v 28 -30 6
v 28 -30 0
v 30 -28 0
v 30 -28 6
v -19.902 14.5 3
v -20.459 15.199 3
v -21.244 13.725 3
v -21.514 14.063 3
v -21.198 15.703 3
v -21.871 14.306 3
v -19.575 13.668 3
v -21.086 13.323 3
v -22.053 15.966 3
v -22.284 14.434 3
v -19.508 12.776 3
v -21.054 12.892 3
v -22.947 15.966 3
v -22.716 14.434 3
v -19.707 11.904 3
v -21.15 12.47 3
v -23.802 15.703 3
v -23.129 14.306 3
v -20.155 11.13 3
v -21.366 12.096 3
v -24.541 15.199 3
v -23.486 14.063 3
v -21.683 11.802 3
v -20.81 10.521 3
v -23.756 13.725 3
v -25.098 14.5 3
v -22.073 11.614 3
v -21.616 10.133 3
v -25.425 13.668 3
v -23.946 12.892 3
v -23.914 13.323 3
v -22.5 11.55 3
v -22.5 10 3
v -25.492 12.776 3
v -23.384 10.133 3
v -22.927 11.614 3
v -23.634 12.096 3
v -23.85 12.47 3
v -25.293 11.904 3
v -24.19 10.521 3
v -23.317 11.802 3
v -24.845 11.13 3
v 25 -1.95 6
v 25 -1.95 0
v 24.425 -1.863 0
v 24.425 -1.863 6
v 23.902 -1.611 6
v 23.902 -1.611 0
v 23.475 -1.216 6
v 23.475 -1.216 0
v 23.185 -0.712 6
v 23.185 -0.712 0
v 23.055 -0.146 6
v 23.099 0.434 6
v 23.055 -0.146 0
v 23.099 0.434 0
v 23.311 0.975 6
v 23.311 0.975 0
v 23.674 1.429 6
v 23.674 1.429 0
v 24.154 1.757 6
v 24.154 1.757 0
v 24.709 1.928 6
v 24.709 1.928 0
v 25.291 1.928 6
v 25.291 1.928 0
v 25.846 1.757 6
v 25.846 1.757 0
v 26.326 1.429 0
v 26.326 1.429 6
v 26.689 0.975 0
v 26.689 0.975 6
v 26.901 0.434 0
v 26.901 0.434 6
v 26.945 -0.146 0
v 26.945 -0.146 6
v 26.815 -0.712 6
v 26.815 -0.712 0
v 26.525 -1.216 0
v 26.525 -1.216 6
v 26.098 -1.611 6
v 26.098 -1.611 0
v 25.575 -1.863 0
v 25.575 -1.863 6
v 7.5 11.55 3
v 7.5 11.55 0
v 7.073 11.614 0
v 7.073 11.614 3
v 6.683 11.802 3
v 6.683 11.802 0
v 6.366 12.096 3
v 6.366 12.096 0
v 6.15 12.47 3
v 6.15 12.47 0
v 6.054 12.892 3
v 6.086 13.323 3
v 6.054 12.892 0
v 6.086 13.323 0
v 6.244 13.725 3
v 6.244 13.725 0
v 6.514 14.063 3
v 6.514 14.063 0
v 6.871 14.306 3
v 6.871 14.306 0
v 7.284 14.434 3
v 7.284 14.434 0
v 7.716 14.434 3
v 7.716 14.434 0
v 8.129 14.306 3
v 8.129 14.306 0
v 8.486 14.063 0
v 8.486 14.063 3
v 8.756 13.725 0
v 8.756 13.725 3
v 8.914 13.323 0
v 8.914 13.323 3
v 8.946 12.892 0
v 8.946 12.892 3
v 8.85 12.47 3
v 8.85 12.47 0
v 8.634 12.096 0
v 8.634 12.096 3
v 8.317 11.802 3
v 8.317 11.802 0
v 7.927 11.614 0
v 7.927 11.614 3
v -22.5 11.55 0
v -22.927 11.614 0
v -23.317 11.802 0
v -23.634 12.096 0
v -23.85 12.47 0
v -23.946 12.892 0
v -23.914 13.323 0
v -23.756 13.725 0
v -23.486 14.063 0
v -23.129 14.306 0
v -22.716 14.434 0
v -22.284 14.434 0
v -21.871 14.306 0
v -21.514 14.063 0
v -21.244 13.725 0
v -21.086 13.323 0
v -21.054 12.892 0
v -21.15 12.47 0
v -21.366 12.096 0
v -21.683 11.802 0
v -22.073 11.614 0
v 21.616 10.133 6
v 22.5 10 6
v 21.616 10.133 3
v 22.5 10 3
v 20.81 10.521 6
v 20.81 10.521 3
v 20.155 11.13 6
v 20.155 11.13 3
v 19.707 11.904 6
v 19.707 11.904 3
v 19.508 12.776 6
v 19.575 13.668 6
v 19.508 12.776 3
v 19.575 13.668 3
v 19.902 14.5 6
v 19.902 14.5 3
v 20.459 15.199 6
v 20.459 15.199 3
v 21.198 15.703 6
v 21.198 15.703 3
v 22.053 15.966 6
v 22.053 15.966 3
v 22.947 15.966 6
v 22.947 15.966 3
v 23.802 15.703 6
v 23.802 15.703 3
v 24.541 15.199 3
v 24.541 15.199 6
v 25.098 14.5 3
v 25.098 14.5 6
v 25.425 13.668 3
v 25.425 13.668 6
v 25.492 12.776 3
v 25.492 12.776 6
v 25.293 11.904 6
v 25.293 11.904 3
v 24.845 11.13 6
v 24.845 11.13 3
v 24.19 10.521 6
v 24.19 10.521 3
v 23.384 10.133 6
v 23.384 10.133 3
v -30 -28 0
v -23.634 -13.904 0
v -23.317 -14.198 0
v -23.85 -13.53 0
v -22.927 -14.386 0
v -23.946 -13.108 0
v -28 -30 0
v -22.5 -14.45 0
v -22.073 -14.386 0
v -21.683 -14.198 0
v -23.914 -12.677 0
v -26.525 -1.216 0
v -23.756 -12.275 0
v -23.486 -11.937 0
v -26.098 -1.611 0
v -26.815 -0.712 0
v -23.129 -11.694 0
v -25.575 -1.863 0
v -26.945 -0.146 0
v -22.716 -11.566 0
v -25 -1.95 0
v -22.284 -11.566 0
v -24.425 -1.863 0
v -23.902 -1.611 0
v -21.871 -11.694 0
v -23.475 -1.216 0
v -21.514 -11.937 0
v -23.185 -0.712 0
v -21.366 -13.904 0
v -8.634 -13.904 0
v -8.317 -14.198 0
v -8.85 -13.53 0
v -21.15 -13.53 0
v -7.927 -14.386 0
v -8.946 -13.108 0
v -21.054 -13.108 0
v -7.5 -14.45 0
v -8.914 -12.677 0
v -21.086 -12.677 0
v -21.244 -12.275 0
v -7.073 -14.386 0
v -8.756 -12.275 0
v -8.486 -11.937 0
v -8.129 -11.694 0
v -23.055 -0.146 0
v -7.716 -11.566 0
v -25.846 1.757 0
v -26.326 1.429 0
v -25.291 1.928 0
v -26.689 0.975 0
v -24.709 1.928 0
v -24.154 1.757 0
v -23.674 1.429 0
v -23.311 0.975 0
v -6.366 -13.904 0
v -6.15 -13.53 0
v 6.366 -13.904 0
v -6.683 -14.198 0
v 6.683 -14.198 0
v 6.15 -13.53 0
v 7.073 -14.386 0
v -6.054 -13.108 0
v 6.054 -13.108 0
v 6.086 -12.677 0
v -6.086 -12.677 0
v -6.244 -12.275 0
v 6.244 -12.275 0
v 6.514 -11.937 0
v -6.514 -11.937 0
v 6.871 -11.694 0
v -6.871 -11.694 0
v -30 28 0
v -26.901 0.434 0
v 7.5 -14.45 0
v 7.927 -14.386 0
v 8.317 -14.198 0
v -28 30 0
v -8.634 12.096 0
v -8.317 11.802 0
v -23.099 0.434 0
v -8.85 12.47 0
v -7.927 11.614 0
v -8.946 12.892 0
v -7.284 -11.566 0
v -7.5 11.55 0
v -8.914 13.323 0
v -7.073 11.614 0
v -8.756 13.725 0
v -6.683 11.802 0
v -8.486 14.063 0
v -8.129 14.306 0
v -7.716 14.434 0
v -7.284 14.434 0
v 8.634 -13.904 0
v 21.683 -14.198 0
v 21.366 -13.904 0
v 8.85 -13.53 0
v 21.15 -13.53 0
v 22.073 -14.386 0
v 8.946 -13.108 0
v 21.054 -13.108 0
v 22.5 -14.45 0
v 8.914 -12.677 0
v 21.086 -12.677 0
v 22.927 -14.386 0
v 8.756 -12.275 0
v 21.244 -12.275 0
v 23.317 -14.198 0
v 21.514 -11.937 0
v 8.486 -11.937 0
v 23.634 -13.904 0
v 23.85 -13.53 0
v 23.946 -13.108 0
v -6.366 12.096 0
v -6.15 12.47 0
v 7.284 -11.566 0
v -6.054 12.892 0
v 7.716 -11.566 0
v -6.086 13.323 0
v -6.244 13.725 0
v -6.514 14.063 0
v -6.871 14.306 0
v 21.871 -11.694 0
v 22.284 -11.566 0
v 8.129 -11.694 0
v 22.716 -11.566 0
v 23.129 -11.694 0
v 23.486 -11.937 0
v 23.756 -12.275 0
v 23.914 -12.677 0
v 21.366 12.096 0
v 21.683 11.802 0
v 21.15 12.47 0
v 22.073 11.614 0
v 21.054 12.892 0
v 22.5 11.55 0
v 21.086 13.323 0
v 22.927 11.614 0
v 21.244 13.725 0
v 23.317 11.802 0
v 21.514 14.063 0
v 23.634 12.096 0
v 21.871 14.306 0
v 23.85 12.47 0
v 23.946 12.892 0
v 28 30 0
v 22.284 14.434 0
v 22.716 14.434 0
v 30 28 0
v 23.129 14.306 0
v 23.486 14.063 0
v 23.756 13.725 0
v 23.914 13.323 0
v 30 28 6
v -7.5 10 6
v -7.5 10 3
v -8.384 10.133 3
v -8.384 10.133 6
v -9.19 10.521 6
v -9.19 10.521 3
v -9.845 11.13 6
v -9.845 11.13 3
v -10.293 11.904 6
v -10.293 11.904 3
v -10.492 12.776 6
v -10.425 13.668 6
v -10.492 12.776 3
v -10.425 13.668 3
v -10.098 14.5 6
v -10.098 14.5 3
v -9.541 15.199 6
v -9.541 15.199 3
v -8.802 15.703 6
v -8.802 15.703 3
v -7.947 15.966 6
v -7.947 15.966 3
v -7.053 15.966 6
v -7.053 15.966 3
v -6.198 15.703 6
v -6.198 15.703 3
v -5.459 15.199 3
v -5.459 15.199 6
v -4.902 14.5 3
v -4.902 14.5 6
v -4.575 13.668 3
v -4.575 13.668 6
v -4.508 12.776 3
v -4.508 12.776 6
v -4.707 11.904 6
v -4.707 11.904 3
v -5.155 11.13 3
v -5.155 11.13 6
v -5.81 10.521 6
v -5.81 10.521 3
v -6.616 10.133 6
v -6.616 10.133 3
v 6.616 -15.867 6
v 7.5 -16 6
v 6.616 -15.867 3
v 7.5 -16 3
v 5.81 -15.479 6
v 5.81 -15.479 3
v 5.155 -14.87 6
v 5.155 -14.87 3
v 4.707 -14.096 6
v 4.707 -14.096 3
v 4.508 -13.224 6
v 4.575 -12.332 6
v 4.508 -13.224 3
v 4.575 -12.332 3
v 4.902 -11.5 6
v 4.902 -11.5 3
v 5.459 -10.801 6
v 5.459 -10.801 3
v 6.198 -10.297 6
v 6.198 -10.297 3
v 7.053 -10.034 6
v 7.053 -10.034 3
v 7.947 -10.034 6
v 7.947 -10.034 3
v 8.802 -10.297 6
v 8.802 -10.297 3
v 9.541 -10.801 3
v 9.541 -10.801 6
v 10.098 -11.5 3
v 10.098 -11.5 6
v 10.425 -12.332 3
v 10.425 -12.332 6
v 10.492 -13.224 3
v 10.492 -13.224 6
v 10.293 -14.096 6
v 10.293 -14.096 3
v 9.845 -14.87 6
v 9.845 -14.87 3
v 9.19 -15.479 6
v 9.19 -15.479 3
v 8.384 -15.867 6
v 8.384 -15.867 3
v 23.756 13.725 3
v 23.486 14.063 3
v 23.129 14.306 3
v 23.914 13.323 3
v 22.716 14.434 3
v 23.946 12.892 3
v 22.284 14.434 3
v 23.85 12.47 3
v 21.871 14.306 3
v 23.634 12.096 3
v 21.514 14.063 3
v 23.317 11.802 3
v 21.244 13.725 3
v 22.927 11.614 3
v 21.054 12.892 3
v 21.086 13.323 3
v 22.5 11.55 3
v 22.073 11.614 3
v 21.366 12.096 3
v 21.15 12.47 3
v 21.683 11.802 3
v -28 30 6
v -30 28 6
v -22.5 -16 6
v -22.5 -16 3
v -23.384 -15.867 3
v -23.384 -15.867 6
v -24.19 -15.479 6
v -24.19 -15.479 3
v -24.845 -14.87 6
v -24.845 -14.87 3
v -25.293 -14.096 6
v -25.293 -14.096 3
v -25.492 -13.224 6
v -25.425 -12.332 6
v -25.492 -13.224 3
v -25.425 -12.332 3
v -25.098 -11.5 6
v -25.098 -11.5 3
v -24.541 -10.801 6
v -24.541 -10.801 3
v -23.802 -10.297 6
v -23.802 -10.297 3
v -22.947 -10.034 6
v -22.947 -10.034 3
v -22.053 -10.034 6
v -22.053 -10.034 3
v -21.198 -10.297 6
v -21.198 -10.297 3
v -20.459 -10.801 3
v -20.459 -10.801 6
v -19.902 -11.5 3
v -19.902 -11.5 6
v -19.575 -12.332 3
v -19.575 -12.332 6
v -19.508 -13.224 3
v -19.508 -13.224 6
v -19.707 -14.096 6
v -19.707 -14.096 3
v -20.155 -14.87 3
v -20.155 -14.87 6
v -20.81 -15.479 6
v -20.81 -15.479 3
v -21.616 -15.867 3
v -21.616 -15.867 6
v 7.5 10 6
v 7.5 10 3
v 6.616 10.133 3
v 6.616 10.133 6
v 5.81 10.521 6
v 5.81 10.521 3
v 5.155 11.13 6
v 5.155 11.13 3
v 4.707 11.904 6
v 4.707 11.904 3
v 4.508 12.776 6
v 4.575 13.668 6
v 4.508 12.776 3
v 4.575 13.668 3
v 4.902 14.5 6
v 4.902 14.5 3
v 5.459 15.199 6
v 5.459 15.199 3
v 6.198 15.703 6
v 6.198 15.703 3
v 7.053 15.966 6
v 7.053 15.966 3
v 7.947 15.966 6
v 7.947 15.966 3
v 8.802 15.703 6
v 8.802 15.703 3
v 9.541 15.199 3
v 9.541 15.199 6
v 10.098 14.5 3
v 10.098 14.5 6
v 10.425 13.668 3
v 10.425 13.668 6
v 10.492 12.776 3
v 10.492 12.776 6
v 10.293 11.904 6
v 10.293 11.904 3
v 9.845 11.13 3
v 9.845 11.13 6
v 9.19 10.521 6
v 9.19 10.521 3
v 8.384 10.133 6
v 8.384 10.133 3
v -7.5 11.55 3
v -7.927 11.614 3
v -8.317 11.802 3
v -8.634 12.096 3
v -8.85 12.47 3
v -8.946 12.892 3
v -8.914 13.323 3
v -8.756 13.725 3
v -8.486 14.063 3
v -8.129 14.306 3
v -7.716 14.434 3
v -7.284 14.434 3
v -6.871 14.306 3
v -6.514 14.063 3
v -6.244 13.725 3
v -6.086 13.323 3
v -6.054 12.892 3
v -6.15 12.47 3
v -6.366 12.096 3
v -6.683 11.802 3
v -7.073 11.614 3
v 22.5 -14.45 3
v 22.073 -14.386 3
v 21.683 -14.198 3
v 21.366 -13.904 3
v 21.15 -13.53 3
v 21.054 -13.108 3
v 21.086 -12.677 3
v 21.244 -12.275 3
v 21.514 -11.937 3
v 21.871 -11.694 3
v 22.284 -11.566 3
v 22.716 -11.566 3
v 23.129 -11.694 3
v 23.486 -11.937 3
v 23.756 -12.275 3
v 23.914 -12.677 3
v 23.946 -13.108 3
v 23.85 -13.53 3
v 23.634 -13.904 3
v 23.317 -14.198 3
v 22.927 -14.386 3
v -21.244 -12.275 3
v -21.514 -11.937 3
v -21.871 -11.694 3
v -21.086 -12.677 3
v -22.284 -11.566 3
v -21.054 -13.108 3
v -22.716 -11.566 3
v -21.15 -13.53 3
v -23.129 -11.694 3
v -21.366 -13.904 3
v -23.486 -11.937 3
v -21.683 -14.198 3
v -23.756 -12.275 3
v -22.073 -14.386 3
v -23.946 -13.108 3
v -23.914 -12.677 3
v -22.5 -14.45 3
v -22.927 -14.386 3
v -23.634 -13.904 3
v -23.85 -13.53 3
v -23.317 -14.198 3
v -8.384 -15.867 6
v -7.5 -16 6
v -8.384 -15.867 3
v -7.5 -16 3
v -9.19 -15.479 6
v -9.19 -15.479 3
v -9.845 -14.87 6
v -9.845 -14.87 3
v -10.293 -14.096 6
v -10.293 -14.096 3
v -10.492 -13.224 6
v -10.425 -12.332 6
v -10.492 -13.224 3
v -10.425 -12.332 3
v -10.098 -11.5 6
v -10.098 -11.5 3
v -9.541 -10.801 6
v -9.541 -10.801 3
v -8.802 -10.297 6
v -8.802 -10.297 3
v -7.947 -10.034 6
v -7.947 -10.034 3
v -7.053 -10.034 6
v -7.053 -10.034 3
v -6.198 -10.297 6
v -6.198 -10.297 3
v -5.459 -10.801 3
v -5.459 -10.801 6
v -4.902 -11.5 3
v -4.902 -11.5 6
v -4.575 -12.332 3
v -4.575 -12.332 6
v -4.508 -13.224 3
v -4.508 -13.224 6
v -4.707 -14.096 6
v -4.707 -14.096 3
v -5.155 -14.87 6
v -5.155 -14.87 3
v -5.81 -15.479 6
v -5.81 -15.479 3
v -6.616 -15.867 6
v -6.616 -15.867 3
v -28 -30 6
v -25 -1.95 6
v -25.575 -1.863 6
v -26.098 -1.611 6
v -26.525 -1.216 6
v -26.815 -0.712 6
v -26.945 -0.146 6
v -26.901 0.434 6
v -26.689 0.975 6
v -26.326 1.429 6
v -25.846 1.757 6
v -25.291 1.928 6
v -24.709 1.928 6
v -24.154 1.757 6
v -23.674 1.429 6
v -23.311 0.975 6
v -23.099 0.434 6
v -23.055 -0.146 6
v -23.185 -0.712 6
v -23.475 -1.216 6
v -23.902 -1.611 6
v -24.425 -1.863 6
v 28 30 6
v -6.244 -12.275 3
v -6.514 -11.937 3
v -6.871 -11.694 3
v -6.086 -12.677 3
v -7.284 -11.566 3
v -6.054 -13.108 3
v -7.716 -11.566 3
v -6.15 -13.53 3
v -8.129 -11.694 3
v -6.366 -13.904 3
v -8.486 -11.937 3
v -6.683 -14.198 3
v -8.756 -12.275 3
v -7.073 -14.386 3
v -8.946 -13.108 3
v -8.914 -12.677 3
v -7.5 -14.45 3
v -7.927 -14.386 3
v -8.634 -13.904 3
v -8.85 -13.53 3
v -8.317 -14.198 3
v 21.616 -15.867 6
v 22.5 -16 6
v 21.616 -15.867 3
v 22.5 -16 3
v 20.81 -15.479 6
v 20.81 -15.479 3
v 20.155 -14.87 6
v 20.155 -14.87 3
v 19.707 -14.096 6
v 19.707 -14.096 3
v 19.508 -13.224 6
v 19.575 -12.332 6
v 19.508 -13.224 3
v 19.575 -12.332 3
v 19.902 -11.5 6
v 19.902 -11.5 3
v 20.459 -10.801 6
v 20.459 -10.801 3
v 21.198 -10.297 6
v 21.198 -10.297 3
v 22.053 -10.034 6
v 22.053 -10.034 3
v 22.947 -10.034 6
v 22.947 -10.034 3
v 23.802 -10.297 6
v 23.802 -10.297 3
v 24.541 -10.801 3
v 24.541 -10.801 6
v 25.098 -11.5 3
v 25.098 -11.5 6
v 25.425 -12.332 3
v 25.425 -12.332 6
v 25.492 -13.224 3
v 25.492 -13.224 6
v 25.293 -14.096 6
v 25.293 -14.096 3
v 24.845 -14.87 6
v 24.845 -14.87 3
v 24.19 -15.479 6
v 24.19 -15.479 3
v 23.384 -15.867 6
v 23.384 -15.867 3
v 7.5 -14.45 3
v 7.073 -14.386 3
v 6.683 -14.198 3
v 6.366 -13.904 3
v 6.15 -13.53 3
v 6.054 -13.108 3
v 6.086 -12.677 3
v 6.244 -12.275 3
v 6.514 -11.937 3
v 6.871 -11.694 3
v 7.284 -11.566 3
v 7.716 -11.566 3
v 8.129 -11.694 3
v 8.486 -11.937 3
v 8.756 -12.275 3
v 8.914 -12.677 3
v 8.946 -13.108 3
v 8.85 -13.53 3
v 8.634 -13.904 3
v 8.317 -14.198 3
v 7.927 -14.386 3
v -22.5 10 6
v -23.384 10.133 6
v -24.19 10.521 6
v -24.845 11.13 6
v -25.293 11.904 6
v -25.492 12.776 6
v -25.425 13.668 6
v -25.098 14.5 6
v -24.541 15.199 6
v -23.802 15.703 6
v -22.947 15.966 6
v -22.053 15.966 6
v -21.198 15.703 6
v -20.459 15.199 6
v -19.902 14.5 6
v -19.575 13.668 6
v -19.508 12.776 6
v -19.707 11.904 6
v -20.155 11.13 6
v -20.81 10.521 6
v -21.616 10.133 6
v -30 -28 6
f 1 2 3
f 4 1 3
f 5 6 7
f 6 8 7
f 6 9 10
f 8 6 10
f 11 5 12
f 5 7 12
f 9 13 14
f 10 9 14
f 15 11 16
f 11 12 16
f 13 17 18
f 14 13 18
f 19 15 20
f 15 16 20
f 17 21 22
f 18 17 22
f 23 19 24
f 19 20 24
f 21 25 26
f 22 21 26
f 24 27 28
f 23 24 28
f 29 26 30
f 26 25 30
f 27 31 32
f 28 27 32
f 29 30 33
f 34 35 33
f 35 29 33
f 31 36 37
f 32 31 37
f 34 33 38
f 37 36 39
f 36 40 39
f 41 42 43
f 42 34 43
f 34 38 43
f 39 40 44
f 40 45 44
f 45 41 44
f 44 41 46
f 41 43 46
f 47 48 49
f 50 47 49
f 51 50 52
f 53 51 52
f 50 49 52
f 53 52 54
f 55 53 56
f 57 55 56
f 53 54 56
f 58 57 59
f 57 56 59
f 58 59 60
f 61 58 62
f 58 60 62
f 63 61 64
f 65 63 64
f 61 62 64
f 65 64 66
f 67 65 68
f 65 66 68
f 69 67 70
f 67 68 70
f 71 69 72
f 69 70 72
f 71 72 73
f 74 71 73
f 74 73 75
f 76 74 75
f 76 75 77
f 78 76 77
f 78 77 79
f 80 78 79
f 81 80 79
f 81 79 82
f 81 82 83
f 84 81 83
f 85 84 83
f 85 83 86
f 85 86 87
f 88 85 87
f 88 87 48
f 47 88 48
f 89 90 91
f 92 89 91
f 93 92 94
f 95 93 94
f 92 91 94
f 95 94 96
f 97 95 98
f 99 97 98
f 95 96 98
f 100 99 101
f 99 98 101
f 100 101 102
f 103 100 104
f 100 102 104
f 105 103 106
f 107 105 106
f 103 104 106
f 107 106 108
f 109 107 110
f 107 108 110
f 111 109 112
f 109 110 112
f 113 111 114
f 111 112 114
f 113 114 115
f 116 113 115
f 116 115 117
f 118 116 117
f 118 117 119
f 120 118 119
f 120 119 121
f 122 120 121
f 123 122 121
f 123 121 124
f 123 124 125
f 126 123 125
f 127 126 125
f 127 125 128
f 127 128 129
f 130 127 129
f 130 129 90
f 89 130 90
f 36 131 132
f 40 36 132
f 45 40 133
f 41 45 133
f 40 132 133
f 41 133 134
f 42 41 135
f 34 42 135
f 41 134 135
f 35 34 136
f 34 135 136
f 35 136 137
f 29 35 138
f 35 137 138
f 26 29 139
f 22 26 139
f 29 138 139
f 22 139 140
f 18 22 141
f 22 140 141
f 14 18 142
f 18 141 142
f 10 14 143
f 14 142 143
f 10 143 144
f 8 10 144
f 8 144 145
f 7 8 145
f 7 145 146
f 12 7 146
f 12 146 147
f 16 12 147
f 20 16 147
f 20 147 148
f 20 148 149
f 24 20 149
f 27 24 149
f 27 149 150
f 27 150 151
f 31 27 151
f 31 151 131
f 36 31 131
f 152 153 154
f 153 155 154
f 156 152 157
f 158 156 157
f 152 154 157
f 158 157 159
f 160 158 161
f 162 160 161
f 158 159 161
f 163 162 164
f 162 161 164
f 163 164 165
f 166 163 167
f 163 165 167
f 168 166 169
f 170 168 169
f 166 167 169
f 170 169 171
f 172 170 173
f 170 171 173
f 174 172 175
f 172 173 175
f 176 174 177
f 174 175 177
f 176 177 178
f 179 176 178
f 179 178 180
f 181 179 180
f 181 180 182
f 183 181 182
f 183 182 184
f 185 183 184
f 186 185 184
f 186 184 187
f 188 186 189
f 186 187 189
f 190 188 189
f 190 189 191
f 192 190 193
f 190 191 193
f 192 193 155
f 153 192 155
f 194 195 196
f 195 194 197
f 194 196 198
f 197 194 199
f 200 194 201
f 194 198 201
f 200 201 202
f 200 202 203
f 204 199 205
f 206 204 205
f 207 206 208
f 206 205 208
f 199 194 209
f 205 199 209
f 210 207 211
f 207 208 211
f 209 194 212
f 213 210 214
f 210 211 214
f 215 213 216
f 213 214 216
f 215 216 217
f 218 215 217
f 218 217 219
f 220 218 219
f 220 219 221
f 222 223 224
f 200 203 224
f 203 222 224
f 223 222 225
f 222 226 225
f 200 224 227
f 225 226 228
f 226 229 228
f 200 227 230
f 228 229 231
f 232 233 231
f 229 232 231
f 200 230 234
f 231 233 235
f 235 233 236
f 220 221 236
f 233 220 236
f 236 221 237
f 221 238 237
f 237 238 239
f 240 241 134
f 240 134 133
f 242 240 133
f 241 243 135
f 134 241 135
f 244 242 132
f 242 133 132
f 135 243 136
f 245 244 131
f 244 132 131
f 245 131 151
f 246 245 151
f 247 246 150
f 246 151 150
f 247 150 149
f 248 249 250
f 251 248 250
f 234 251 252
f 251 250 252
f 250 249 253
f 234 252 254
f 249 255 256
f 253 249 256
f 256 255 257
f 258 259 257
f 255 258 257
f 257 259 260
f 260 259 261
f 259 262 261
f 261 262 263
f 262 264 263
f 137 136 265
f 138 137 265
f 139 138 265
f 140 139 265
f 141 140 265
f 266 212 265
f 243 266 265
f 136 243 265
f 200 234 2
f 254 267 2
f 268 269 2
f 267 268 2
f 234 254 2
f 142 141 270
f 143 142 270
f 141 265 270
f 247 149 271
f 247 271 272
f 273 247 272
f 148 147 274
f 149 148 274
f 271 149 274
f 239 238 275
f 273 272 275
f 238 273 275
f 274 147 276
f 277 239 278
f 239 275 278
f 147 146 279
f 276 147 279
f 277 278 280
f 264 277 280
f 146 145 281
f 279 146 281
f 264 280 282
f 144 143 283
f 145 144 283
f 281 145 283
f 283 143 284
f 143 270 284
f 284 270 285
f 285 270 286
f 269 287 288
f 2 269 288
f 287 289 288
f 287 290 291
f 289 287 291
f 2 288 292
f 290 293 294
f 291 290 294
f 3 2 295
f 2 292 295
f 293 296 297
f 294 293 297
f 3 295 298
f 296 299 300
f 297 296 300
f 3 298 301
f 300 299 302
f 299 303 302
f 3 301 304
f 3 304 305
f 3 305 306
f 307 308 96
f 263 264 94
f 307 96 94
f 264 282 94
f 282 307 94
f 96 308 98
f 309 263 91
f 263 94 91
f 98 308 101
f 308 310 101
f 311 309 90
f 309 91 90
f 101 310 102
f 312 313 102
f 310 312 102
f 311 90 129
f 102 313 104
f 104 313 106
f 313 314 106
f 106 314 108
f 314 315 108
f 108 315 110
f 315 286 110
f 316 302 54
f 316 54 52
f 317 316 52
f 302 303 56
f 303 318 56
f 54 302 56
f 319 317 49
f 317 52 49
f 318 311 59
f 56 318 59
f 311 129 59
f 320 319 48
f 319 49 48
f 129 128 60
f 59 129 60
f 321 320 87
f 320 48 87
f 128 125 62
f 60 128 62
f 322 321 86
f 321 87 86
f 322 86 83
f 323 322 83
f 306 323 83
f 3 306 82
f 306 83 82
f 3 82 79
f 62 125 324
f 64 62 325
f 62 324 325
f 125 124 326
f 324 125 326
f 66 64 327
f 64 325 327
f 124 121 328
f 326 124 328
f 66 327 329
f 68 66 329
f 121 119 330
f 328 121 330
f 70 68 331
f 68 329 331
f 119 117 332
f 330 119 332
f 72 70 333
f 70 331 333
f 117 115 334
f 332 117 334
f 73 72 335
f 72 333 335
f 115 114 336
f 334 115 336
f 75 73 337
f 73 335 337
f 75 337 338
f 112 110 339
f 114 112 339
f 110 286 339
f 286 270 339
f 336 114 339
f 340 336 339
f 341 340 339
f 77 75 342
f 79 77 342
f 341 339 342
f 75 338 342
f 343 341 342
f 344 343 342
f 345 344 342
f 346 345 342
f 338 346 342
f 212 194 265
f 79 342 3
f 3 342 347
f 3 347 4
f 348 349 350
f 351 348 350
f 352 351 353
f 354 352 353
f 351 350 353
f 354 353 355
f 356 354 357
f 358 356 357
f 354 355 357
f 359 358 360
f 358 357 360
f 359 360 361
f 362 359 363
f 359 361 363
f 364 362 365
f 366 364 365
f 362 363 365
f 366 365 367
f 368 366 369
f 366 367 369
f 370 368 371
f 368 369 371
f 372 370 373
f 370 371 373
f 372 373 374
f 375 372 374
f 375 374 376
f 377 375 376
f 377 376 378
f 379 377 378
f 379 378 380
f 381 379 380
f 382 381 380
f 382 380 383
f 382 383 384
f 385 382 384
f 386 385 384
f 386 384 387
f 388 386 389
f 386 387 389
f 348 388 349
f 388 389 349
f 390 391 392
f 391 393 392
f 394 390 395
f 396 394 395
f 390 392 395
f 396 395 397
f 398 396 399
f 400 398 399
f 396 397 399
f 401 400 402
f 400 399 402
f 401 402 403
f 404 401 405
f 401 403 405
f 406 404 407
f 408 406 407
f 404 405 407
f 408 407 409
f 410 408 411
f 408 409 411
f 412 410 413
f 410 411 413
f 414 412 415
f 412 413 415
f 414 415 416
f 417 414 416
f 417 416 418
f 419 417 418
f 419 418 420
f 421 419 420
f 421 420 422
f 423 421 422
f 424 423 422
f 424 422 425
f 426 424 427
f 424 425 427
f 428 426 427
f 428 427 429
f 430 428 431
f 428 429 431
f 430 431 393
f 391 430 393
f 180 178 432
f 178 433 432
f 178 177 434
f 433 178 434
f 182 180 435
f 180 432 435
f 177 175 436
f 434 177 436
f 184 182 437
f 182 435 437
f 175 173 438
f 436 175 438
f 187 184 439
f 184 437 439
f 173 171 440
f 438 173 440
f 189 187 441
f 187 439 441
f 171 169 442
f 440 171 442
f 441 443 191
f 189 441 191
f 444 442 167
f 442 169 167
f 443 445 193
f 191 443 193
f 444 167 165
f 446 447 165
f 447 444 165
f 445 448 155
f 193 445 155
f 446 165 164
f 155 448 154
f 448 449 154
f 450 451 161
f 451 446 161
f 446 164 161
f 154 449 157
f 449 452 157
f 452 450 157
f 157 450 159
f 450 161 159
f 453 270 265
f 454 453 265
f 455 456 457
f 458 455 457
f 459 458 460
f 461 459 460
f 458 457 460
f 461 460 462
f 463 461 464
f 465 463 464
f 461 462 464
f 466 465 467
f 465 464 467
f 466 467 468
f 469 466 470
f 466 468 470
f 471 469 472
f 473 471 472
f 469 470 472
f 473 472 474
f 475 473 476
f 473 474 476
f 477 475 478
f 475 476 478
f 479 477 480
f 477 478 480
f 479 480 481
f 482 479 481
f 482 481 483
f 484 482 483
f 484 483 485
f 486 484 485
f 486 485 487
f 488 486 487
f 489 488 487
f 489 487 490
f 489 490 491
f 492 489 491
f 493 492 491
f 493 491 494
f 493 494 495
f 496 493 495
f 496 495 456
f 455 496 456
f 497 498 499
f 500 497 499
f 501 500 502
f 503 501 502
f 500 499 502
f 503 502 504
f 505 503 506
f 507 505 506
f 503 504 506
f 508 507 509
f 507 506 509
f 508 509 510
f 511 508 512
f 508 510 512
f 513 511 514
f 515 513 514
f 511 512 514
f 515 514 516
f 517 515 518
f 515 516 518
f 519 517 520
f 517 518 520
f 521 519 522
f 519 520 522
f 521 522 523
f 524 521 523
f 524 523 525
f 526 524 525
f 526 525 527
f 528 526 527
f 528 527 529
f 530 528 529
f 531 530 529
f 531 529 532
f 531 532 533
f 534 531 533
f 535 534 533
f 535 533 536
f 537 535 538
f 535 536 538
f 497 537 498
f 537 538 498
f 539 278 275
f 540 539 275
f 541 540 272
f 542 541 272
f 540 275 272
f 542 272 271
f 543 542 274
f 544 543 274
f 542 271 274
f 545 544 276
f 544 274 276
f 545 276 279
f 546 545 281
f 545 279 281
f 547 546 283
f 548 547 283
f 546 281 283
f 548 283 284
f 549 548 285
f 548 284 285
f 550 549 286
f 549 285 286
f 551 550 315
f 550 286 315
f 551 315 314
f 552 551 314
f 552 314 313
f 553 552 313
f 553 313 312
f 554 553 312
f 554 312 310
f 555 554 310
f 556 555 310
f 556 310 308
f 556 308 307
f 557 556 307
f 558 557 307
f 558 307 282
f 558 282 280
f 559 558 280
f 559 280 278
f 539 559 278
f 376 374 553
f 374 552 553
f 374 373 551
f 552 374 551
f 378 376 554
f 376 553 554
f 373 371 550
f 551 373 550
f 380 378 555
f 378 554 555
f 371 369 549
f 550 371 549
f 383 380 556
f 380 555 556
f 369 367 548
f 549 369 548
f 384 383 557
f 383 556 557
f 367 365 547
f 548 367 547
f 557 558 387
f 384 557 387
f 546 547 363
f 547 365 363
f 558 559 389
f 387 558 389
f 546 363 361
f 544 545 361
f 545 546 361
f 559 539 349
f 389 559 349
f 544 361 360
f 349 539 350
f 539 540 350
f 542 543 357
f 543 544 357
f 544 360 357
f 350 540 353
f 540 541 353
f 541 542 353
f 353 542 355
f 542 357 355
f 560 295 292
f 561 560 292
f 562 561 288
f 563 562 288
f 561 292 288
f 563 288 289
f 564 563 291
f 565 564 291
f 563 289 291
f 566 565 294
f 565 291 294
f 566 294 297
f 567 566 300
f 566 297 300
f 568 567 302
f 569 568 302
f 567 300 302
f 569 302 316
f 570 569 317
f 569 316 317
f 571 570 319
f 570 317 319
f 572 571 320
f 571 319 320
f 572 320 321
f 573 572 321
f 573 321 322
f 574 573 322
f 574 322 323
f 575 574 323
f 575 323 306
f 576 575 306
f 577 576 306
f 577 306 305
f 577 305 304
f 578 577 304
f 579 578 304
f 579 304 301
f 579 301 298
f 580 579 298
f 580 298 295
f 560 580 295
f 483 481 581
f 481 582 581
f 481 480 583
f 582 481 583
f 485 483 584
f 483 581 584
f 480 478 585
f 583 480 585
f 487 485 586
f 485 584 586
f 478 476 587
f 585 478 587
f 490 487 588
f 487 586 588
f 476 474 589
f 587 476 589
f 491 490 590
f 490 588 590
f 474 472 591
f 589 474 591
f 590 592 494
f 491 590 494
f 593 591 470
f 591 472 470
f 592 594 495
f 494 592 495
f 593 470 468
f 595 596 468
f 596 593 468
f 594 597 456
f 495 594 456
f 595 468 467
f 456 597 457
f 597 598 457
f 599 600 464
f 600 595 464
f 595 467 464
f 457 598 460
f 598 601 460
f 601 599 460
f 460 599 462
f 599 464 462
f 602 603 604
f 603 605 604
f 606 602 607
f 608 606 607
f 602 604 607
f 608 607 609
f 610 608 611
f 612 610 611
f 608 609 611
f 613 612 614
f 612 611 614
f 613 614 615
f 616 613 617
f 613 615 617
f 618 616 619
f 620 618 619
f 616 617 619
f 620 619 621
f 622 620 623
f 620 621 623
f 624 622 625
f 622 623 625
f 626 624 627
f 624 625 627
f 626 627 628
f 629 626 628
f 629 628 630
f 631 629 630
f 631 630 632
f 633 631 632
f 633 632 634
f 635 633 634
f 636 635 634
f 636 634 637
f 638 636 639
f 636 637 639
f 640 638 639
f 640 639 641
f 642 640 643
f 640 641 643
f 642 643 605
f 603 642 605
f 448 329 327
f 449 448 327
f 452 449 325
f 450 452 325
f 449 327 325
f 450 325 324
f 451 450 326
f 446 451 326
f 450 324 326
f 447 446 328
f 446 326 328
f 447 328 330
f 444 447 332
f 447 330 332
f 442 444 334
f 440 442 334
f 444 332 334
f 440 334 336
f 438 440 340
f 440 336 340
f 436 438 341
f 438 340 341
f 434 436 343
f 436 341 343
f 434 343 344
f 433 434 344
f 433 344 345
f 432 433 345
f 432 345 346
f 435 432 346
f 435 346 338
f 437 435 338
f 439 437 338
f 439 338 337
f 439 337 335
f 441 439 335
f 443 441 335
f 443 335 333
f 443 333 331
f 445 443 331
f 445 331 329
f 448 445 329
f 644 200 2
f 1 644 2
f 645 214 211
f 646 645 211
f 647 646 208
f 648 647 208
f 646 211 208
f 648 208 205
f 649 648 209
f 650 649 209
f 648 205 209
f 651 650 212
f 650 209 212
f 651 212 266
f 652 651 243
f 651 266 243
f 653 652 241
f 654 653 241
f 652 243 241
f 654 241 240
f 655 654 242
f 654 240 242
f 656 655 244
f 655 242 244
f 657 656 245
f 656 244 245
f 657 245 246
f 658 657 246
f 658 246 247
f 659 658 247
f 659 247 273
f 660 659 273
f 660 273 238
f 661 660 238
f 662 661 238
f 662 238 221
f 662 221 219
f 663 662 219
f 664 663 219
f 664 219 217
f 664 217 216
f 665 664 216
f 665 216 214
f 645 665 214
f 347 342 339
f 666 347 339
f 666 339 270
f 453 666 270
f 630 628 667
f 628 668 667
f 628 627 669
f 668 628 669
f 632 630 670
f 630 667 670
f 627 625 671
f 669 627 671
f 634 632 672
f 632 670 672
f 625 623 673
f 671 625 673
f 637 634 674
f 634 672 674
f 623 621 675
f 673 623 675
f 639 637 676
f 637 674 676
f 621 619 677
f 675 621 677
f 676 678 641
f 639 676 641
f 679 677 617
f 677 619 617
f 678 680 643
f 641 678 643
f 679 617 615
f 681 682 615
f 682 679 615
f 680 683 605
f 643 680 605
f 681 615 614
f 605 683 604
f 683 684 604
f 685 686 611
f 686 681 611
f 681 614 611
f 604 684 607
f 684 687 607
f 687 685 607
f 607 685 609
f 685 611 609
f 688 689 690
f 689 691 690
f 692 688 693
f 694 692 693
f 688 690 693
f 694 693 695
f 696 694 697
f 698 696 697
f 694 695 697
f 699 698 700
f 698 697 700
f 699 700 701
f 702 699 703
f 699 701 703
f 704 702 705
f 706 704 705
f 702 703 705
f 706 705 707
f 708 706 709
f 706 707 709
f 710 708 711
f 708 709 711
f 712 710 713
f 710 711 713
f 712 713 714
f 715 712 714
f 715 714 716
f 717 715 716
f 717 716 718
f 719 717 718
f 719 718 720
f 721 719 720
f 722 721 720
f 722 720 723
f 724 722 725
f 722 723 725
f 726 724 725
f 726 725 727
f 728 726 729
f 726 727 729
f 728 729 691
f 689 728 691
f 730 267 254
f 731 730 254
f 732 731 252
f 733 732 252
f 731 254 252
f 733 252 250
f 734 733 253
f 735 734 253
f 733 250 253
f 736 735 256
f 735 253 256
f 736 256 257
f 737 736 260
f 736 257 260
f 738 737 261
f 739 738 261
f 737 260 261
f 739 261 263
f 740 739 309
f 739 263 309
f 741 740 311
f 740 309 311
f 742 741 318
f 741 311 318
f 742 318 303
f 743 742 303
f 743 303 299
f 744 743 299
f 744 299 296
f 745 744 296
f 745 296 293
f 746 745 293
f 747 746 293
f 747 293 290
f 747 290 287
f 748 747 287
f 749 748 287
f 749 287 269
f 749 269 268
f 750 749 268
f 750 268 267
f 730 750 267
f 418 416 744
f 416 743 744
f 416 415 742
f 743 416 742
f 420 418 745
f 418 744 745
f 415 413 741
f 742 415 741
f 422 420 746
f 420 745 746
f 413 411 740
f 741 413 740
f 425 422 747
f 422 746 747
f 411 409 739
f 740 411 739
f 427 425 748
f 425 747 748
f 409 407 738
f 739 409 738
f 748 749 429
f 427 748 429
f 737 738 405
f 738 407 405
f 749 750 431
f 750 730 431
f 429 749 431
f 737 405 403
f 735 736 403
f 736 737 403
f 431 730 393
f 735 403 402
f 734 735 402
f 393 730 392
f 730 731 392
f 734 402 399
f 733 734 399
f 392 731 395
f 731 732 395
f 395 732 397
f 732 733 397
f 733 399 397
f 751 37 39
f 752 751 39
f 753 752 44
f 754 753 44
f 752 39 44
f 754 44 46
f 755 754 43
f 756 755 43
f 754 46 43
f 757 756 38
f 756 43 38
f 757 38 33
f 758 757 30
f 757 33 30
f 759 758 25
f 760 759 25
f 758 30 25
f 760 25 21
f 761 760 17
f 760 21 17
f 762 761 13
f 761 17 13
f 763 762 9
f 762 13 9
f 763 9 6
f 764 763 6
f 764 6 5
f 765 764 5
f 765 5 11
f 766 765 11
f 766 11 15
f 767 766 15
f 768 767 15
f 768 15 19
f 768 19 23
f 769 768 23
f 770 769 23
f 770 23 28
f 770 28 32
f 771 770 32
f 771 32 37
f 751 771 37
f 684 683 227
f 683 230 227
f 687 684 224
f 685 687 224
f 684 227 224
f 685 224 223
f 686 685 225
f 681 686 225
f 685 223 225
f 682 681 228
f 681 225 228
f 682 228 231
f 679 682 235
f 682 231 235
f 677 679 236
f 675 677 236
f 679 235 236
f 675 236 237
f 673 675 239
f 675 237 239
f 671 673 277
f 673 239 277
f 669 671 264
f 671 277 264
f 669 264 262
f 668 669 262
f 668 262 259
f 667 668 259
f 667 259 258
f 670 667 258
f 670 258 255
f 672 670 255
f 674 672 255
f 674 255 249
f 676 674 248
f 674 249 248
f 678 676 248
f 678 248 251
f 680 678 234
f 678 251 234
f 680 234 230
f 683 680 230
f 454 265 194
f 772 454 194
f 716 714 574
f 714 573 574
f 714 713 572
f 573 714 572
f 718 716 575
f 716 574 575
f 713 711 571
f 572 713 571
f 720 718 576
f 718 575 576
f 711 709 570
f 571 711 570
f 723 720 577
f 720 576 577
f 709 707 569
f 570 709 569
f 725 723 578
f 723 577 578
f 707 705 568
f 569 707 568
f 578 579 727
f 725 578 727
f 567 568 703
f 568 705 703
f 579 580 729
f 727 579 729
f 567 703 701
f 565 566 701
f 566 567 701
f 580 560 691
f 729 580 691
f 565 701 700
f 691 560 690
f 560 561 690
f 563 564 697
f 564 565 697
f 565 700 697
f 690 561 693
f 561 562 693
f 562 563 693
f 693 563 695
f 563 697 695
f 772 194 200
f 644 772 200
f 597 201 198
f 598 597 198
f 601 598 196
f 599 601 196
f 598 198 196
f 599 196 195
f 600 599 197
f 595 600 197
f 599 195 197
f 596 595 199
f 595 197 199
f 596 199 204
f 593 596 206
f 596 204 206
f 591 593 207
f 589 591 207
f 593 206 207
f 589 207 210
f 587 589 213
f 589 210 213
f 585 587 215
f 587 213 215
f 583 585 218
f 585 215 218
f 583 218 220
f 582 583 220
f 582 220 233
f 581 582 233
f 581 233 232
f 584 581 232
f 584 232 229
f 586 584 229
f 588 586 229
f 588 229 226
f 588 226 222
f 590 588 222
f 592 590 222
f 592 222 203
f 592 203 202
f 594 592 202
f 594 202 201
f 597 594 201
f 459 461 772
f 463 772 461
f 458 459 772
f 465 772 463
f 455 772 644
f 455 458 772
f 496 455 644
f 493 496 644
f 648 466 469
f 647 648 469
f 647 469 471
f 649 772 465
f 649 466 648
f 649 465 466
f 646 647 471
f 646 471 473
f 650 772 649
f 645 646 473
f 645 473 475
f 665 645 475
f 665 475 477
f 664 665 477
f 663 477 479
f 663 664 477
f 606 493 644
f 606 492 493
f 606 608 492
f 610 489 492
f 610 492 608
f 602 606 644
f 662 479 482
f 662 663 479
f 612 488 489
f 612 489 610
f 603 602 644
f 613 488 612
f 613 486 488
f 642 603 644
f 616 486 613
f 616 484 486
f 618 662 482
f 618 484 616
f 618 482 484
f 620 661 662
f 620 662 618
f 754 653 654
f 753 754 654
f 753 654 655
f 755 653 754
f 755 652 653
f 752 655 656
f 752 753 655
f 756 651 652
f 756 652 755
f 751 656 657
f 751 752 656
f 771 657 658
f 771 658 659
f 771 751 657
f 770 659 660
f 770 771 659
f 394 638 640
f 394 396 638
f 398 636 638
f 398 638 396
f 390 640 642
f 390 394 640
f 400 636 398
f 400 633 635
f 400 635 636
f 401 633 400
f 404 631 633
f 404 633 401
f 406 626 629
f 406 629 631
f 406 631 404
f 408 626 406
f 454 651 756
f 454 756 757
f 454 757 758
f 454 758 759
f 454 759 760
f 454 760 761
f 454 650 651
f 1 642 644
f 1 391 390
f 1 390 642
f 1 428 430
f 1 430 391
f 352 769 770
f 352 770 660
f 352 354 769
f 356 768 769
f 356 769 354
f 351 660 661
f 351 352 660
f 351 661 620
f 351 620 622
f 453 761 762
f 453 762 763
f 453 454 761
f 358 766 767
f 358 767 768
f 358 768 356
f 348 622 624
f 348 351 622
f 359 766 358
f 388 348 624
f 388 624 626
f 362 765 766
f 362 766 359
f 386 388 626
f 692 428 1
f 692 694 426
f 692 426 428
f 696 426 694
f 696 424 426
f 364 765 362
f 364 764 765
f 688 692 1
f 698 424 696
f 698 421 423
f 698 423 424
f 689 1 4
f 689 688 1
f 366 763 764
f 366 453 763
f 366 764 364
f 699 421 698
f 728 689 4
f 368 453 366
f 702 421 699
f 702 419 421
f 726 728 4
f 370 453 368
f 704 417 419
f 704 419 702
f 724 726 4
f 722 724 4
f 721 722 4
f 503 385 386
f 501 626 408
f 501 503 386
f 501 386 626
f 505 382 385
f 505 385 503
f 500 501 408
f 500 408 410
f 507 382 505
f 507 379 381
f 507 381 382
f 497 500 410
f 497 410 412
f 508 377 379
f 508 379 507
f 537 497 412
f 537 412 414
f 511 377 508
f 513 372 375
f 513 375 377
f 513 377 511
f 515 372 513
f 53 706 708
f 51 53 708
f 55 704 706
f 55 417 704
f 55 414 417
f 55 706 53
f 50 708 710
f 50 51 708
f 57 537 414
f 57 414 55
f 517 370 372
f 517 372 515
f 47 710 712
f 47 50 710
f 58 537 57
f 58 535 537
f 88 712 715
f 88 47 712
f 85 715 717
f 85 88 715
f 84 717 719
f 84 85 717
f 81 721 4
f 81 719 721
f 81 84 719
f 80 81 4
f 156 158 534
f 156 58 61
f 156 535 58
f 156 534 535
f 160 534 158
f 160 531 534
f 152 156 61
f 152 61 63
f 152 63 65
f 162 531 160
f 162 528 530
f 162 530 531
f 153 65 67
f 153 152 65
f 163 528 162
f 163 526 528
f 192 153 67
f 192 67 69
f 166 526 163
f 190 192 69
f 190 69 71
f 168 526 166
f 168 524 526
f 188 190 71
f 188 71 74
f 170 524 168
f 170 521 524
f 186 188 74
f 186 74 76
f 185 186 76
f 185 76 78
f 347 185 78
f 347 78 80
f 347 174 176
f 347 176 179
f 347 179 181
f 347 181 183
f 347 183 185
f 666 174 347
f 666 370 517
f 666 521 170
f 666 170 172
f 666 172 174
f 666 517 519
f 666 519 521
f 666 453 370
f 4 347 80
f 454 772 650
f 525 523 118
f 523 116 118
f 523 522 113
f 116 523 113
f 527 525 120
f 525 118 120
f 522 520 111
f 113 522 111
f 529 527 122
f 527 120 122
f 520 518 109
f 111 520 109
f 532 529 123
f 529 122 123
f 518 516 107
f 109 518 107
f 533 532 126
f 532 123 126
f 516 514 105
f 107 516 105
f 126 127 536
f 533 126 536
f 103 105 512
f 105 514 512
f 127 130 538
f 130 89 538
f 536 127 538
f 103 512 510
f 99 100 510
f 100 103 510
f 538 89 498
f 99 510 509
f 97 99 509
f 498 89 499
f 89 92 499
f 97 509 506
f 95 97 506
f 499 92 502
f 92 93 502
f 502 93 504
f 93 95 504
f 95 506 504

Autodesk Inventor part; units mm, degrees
ref_plane "YZ Plane" through (0, 0, 0) normal (1, 0, 0) x (0, 1, 0)
ref_plane "XZ Plane" through (0, 0, 0) normal (0, 1, 0) x (-1, 0, 0)
ref_plane "XY Plane" through (0, 0, 0) normal (0, 0, 1) x (1, 0, 0)
ref_plane "Work Plane1" through (0, 0, 0) normal (0, 0, 1) x (1, 0, 0)
sketch "Sketch1" plane through (0, 0, 0) normal (0, 0, 1) x (1, 0, 0)
  line L0 (-28, 30) -> (-30, 28) projected
  line L1 (-30, 28) -> (-30, -28) projected
  line L2 (-30, -28) -> (-28, -30) projected
  line L3 (-28, -30) -> (28, -30) projected
  line L4 (28, -30) -> (30, -28) projected
  line L5 (30, -28) -> (30, -17.7934) projected
  line L6 (30, 28) -> (28, 30) projected
  line L7 (28, 30) -> (17.7934, 30) projected
  line L8 (-25, -25) -> (25, -25) construction
  line L9 (25, -25) -> (25, 25) construction
  line L10 (25, 25) -> (-25, 25) construction
  line L11 (-25, 25) -> (-25, -25) construction
  line L12 (-25, -25) -> (25, 25) construction
  line L13 (25, -25) -> (-25, 25) construction
  line L14 (30, -17.7934) -> (44, -17.7934) projected
  line L15 (44, -9.0511) -> (44, -17.7934) projected
  line L16 (30, -9.0511) -> (44, -9.0511) construction
  line L17 (30, -9.0511) -> (30, 8.3051) projected
  line L18 (30, 8.3051) -> (44, 8.3051) projected
  line L19 (44, 19.2331) -> (44, 8.3051) projected
  line L20 (30, 19.2331) -> (44, 19.2331) construction
  line L21 (30, 28) -> (30, -28) projected
  line L22 (17.7934, 30) -> (17.7934, 44) projected
  line L23 (9.0511, 44) -> (17.7934, 44) projected
  line L24 (9.0511, 30) -> (9.0511, 44) construction
  line L25 (-8.3051, 30) -> (-8.3051, 44) projected
  line L26 (-19.2331, 44) -> (-8.3051, 44) projected
  line L27 (-19.2331, 30) -> (-19.2331, 44) construction
  line L28 (-19.2331, 30) -> (-28, 30) projected
  line L29 (30, 19.2331) -> (30, 28) projected
  line L30 (9.0511, 30) -> (-8.3051, 30) projected
  line L31 (-28, 30) -> (28, 30) projected
  line L32 (25, 0) -> (-25, 0)
  point P0 (0, 0)
  dimension "d0" = 50
  dimension "d1" = 50
extrude "Extrusion1" add sketch "Sketch1" along normal blind 6
sketch "Sketch2" plane through (0, 0, 6) normal (0, 0, 1) x (1, 0, 0)
  line L0 (-25, -25) -> (25, -25)
  line L1 (25, -25) -> (25, 25)
  line L2 (25, 25) -> (-25, 25)
  line L3 (-25, 25) -> (-25, -25)
  line L4 (-25, -25) -> (25, 25) construction
  line L5 (25, -25) -> (-25, 25) construction
  point P0 (0, 0)
  point P1 (25, 0)
  point P2 (-25, 0)
  point P3 (0, 25)
  point P4 (0, -25)
  dimension "d4" = 50
  dimension "d5" = 50
hole "Hole1" at (-25, 0, 6) at (25, 0, 6) direction (0, 0, -1) diameter 3.9 depth 10 tip angle 118
sketch "Sketch3" plane through (0, 0, 6) normal (0, 0, 1) x (1, 0, 0)
  circle A0 centre (25, 0) radius 1.95 projected
  circle A1 centre (-25, 0) radius 1.95 projected
  line L0 (-28, 30) -> (-30, 28) projected
  line L1 (-30, 28) -> (-30, -28) projected
  line L2 (-30, -28) -> (-28, -30) projected
  line L3 (-28, -30) -> (28, -30) projected
  line L4 (28, -30) -> (30, -28) projected
  line L5 (30, -28) -> (30, 28) projected
  line L6 (30, 28) -> (28, 30) projected
  line L7 (28, 30) -> (-28, 30) projected
  line L8 (-22.5, -13) -> (22.5, -13) construction
  line L9 (22.5, -13) -> (22.5, 13) construction
  line L10 (22.5, 13) -> (-22.5, 13) construction
  line L11 (-22.5, 13) -> (-22.5, -13) construction
  line L12 (-22.5, -13) -> (22.5, 13) construction
  line L13 (22.5, -13) -> (-22.5, 13) construction
  line L14 (7.5, -13) -> (-7.5, -13) construction
  line L15 (-7.5, -13) -> (-7.5, 13) construction
  line L16 (-7.5, 13) -> (7.5, 13) construction
  line L17 (7.5, 13) -> (7.5, -13) construction
  line L18 (7.5, -13) -> (-7.5, 13) construction
  line L19 (-7.5, -13) -> (7.5, 13) construction
  point P0 (0, 0)
  dimension "d13" = 45
  dimension "d14" = 26
  dimension "d15" = 15
hole "Hole2" at (22.5, 13, 6) at (7.5, 13, 6) at (-7.5, 13, 6) at (-22.5, 13, 6) at (-22.5, -13, 6) at (-7.5, -13, 6) at (7.5, -13, 6) at (22.5, -13, 6) direction (0, 0, -1) diameter 2.9 depth 10 tip angle 118 counterbore diameter 6 counterbore depth 3
properties part number "00_XY_stage-CHUO_SEIKI_LD-647-R1-Bottom"
